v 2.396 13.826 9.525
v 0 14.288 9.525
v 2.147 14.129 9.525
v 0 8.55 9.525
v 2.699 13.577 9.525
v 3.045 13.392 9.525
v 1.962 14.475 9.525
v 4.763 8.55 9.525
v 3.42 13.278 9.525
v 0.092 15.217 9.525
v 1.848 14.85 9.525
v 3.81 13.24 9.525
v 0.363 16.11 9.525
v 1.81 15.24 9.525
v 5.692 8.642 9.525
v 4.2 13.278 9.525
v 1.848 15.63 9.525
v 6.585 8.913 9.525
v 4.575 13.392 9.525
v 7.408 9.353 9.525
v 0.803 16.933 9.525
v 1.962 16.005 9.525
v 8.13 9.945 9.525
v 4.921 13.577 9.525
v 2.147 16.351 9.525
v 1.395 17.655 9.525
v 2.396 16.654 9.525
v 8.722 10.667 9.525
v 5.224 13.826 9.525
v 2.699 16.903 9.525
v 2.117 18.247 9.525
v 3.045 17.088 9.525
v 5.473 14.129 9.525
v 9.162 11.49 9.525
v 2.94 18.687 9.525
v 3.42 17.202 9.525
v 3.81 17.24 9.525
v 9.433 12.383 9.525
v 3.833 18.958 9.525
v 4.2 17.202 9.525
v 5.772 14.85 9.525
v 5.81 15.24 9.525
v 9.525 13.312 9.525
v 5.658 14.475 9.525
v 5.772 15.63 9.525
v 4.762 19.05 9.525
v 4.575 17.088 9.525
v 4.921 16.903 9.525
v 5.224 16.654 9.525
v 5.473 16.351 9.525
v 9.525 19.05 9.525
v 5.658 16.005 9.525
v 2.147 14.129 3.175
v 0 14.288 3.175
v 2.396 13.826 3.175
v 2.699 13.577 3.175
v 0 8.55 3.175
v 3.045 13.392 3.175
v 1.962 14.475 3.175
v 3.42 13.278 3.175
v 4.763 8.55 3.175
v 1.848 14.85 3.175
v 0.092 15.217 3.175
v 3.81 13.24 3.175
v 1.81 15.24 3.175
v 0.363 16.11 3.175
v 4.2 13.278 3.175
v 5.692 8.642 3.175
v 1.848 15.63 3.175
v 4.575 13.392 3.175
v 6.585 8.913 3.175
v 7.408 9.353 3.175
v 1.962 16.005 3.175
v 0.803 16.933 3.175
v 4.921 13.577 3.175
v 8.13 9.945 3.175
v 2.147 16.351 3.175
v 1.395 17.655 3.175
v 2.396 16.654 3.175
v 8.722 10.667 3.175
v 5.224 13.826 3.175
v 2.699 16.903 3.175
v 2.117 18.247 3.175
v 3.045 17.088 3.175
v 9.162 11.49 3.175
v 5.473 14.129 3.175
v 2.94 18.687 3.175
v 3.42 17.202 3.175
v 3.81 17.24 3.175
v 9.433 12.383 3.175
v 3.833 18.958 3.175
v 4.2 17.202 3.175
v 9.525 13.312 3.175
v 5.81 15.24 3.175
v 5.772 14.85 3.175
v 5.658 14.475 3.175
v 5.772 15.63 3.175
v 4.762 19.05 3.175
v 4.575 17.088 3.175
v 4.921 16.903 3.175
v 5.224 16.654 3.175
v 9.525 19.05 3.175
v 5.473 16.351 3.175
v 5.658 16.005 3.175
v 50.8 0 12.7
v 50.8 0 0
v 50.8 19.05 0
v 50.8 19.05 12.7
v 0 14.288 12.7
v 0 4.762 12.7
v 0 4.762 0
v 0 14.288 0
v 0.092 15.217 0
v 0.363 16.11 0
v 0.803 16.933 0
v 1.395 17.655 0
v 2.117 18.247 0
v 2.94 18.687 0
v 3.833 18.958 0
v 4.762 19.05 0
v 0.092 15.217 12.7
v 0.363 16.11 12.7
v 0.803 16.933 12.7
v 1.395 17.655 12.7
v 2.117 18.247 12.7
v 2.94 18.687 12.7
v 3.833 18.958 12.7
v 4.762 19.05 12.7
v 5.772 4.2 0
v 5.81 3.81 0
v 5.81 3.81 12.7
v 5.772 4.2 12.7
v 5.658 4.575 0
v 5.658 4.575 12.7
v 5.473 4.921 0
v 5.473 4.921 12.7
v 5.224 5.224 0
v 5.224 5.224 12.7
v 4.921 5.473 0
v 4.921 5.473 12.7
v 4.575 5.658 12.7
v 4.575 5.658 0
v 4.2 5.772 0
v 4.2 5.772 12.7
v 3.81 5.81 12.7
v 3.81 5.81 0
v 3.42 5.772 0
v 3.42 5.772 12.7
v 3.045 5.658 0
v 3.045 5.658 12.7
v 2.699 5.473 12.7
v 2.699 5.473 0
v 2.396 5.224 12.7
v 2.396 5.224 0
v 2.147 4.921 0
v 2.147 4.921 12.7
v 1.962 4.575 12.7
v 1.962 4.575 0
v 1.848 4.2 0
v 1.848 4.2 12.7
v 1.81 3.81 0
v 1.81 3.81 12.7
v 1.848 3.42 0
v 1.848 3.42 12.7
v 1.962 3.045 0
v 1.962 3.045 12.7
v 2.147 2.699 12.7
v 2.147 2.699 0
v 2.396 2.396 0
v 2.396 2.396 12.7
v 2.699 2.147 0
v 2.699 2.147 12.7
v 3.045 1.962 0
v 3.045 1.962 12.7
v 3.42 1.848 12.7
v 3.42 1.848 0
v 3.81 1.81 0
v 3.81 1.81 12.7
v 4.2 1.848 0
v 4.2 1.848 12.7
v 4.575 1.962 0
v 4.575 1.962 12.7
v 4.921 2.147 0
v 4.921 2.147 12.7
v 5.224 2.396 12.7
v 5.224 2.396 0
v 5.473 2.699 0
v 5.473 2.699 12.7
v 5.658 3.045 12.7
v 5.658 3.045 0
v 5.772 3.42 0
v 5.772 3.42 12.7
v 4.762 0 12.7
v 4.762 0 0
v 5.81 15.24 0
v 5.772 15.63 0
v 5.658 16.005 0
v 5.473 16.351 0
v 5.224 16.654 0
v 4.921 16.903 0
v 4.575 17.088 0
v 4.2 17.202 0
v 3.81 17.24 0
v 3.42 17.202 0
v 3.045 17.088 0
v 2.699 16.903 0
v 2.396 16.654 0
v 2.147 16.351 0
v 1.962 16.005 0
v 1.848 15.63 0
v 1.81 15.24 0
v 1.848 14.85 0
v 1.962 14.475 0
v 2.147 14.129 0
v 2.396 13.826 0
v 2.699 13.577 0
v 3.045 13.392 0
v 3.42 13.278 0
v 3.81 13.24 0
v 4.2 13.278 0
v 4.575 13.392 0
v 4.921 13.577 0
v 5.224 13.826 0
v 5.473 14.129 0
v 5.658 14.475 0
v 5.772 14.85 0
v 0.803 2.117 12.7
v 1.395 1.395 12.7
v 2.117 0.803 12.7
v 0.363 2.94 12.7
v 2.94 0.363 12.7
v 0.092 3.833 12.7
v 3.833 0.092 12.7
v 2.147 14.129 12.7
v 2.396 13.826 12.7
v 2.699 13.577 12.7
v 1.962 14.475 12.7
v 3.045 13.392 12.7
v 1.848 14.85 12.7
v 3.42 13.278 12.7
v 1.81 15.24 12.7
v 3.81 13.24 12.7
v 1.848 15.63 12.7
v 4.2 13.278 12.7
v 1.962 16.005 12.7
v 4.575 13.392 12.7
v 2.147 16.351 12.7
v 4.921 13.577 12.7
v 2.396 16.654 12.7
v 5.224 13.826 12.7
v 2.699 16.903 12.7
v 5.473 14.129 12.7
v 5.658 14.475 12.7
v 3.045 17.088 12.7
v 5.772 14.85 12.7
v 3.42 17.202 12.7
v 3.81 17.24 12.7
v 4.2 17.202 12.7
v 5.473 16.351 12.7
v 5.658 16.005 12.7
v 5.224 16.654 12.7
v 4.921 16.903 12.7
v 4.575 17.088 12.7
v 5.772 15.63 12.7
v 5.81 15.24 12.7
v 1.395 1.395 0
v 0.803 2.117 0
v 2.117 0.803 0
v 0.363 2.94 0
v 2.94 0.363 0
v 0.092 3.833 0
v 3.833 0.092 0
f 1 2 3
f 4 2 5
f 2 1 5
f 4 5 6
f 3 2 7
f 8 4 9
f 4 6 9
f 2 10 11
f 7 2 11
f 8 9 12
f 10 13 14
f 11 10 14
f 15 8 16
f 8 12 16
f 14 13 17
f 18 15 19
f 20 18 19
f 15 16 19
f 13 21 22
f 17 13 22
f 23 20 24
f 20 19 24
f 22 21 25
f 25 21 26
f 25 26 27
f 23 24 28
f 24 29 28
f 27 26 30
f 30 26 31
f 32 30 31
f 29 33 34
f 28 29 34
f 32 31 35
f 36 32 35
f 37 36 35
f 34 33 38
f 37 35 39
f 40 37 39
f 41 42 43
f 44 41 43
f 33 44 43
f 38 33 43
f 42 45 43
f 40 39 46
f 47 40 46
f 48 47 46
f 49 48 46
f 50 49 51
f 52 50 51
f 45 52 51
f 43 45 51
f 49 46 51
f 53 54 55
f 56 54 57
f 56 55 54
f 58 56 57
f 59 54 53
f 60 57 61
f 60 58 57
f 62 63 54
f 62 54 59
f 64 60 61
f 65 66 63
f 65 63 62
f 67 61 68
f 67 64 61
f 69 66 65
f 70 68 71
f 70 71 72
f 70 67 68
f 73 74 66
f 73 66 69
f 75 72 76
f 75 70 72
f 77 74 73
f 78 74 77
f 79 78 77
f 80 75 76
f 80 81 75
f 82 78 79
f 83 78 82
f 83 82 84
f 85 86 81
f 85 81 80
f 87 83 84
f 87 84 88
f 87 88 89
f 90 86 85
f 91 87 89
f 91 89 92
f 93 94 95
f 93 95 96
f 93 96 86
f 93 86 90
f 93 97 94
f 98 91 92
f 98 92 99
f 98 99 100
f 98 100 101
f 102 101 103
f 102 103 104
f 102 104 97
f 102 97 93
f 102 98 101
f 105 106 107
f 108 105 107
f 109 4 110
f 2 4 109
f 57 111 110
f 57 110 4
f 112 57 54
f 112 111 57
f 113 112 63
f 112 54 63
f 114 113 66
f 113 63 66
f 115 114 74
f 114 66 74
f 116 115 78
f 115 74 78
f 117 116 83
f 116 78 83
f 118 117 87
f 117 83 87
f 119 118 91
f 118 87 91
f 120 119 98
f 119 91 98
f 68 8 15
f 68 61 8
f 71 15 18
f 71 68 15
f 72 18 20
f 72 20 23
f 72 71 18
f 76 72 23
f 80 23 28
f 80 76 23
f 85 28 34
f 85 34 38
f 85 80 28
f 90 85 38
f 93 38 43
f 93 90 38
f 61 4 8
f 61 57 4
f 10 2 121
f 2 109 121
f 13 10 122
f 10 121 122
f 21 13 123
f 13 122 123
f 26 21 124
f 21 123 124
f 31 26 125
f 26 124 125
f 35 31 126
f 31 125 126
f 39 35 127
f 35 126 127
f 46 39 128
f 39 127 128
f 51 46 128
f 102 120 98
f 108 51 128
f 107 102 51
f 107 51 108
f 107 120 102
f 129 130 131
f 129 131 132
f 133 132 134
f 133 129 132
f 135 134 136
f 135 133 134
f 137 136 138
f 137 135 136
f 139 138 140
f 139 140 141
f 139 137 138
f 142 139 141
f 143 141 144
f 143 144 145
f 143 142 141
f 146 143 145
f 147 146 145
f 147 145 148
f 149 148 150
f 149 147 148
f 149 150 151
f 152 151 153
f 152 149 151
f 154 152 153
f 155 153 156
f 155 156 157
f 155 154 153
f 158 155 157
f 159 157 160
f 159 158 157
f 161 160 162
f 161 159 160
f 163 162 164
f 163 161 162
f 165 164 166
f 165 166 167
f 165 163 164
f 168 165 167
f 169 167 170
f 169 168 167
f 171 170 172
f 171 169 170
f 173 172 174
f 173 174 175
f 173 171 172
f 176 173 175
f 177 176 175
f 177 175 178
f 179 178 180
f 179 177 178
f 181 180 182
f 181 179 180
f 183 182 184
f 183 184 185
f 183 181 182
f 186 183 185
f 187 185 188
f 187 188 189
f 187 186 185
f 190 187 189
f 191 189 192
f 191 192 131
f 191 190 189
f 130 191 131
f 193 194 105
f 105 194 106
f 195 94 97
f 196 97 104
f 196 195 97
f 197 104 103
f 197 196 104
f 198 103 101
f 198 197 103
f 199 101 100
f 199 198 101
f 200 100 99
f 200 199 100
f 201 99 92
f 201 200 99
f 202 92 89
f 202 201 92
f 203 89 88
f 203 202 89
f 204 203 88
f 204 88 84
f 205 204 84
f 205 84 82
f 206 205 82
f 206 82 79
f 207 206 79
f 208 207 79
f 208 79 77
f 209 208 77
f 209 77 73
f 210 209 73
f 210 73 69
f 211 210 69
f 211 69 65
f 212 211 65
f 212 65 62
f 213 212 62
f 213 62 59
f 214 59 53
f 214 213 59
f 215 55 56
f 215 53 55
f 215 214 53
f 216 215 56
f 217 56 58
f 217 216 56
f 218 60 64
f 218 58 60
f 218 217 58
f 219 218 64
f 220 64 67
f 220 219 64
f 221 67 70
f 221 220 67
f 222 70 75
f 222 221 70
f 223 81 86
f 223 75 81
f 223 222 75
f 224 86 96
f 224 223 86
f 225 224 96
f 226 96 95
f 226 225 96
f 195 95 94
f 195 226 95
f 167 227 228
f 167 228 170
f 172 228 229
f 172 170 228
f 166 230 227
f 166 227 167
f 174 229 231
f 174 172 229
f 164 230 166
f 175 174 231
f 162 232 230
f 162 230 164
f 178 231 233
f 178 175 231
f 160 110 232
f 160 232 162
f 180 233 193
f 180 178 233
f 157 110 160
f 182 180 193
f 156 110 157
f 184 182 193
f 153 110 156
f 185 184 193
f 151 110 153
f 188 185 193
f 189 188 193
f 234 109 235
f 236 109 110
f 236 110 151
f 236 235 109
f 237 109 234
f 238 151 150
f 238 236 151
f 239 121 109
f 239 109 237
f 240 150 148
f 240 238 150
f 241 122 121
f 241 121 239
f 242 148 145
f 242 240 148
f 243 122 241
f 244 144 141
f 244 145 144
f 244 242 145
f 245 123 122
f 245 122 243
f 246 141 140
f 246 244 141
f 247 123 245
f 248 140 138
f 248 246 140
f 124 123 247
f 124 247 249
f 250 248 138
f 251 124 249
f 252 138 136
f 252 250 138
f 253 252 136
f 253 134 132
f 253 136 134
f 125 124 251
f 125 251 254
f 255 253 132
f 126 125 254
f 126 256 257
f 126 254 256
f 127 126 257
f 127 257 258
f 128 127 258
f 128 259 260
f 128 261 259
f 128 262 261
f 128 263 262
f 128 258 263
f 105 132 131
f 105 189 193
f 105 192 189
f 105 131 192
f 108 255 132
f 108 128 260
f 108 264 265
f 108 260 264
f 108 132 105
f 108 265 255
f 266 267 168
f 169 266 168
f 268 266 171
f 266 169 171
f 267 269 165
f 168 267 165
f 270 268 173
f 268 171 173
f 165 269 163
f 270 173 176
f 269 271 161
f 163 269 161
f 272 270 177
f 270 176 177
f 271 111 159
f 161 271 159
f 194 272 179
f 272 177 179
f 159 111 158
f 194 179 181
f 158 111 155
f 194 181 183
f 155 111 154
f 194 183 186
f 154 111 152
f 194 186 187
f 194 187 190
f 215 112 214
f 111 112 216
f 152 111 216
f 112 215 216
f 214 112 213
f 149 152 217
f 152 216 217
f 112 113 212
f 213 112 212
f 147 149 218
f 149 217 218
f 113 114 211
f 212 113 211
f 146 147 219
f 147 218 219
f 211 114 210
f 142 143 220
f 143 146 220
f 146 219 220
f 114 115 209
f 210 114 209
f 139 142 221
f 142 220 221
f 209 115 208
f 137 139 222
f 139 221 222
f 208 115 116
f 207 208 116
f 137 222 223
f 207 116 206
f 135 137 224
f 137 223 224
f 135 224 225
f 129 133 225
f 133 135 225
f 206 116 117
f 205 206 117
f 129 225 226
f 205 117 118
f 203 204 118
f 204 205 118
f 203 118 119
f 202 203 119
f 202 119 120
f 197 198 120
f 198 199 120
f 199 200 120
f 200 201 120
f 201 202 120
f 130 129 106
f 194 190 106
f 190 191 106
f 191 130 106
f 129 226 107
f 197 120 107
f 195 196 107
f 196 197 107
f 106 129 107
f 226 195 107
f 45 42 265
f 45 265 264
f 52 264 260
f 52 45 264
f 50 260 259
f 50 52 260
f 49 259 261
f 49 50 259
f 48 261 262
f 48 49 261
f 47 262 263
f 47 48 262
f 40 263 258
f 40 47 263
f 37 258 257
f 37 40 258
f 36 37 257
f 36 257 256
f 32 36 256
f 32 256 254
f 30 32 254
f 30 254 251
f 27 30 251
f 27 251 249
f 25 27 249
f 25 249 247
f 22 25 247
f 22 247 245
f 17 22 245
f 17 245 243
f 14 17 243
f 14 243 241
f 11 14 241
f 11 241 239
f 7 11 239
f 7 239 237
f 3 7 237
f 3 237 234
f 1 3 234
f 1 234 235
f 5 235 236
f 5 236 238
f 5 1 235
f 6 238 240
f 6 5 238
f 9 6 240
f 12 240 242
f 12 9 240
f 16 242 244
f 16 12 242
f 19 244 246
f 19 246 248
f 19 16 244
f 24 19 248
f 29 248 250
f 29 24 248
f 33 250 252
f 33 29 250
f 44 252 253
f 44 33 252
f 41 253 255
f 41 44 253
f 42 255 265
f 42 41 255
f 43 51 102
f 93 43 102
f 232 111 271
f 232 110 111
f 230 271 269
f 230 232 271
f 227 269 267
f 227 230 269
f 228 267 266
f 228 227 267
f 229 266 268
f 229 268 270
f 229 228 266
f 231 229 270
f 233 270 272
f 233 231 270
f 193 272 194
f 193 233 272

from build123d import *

# Parameters (mm, degrees)
SKETCH1_W           = 50.8
SKETCH1_H           = 19.05
SKETCH1_R           = 2
BOSS_EXTRUDE1_DEPTH = 12.7
SKETCH2_W           = 9.525
SKETCH2_H           = 6.35
CUT_EXTRUDE1_DEPTH  = 10.5
FILLET1_R           = 4.7625
FILLET2_R           = 4.7625


with BuildPart() as part:
    # Sketch1 → Boss-Extrude1 (new body)
    with BuildSketch(Plane.XY):
        with Locations((25.4, 9.525)):
            Rectangle(SKETCH1_W, SKETCH1_H)
        with Locations((3.81, 3.81)):
            Circle(SKETCH1_R, mode=Mode.SUBTRACT)
        with Locations((3.81, 15.24)):
            Circle(SKETCH1_R, mode=Mode.SUBTRACT)
    extrude(amount=BOSS_EXTRUDE1_DEPTH)

    # Sketch2 → Cut-Extrude1 (cut)
    with BuildSketch(Plane(origin=(0, 19.05, 0), x_dir=(1, 0, 0), z_dir=(0, 1, 0))):
        with Locations((4.7625, -6.35)):
            Rectangle(SKETCH2_W, SKETCH2_H)
    extrude(amount=-CUT_EXTRUDE1_DEPTH, mode=Mode.SUBTRACT)

    # Fillet1
    fillet1_edges = [part.edges().sort_by_distance(p)[0] for p in [
        (9.525, 8.55, 6.35),
    ]]
    fillet(fillet1_edges, radius=FILLET1_R)

    # Fillet2
    fillet2_edges = [part.edges().sort_by_distance(p)[0] for p in [
        (0, 19.05, 1.5875),
        (0, 19.05, 11.1125),
        (0, 0, 6.35),
    ]]
    fillet(fillet2_edges, radius=FILLET2_R)


solid = part.part
